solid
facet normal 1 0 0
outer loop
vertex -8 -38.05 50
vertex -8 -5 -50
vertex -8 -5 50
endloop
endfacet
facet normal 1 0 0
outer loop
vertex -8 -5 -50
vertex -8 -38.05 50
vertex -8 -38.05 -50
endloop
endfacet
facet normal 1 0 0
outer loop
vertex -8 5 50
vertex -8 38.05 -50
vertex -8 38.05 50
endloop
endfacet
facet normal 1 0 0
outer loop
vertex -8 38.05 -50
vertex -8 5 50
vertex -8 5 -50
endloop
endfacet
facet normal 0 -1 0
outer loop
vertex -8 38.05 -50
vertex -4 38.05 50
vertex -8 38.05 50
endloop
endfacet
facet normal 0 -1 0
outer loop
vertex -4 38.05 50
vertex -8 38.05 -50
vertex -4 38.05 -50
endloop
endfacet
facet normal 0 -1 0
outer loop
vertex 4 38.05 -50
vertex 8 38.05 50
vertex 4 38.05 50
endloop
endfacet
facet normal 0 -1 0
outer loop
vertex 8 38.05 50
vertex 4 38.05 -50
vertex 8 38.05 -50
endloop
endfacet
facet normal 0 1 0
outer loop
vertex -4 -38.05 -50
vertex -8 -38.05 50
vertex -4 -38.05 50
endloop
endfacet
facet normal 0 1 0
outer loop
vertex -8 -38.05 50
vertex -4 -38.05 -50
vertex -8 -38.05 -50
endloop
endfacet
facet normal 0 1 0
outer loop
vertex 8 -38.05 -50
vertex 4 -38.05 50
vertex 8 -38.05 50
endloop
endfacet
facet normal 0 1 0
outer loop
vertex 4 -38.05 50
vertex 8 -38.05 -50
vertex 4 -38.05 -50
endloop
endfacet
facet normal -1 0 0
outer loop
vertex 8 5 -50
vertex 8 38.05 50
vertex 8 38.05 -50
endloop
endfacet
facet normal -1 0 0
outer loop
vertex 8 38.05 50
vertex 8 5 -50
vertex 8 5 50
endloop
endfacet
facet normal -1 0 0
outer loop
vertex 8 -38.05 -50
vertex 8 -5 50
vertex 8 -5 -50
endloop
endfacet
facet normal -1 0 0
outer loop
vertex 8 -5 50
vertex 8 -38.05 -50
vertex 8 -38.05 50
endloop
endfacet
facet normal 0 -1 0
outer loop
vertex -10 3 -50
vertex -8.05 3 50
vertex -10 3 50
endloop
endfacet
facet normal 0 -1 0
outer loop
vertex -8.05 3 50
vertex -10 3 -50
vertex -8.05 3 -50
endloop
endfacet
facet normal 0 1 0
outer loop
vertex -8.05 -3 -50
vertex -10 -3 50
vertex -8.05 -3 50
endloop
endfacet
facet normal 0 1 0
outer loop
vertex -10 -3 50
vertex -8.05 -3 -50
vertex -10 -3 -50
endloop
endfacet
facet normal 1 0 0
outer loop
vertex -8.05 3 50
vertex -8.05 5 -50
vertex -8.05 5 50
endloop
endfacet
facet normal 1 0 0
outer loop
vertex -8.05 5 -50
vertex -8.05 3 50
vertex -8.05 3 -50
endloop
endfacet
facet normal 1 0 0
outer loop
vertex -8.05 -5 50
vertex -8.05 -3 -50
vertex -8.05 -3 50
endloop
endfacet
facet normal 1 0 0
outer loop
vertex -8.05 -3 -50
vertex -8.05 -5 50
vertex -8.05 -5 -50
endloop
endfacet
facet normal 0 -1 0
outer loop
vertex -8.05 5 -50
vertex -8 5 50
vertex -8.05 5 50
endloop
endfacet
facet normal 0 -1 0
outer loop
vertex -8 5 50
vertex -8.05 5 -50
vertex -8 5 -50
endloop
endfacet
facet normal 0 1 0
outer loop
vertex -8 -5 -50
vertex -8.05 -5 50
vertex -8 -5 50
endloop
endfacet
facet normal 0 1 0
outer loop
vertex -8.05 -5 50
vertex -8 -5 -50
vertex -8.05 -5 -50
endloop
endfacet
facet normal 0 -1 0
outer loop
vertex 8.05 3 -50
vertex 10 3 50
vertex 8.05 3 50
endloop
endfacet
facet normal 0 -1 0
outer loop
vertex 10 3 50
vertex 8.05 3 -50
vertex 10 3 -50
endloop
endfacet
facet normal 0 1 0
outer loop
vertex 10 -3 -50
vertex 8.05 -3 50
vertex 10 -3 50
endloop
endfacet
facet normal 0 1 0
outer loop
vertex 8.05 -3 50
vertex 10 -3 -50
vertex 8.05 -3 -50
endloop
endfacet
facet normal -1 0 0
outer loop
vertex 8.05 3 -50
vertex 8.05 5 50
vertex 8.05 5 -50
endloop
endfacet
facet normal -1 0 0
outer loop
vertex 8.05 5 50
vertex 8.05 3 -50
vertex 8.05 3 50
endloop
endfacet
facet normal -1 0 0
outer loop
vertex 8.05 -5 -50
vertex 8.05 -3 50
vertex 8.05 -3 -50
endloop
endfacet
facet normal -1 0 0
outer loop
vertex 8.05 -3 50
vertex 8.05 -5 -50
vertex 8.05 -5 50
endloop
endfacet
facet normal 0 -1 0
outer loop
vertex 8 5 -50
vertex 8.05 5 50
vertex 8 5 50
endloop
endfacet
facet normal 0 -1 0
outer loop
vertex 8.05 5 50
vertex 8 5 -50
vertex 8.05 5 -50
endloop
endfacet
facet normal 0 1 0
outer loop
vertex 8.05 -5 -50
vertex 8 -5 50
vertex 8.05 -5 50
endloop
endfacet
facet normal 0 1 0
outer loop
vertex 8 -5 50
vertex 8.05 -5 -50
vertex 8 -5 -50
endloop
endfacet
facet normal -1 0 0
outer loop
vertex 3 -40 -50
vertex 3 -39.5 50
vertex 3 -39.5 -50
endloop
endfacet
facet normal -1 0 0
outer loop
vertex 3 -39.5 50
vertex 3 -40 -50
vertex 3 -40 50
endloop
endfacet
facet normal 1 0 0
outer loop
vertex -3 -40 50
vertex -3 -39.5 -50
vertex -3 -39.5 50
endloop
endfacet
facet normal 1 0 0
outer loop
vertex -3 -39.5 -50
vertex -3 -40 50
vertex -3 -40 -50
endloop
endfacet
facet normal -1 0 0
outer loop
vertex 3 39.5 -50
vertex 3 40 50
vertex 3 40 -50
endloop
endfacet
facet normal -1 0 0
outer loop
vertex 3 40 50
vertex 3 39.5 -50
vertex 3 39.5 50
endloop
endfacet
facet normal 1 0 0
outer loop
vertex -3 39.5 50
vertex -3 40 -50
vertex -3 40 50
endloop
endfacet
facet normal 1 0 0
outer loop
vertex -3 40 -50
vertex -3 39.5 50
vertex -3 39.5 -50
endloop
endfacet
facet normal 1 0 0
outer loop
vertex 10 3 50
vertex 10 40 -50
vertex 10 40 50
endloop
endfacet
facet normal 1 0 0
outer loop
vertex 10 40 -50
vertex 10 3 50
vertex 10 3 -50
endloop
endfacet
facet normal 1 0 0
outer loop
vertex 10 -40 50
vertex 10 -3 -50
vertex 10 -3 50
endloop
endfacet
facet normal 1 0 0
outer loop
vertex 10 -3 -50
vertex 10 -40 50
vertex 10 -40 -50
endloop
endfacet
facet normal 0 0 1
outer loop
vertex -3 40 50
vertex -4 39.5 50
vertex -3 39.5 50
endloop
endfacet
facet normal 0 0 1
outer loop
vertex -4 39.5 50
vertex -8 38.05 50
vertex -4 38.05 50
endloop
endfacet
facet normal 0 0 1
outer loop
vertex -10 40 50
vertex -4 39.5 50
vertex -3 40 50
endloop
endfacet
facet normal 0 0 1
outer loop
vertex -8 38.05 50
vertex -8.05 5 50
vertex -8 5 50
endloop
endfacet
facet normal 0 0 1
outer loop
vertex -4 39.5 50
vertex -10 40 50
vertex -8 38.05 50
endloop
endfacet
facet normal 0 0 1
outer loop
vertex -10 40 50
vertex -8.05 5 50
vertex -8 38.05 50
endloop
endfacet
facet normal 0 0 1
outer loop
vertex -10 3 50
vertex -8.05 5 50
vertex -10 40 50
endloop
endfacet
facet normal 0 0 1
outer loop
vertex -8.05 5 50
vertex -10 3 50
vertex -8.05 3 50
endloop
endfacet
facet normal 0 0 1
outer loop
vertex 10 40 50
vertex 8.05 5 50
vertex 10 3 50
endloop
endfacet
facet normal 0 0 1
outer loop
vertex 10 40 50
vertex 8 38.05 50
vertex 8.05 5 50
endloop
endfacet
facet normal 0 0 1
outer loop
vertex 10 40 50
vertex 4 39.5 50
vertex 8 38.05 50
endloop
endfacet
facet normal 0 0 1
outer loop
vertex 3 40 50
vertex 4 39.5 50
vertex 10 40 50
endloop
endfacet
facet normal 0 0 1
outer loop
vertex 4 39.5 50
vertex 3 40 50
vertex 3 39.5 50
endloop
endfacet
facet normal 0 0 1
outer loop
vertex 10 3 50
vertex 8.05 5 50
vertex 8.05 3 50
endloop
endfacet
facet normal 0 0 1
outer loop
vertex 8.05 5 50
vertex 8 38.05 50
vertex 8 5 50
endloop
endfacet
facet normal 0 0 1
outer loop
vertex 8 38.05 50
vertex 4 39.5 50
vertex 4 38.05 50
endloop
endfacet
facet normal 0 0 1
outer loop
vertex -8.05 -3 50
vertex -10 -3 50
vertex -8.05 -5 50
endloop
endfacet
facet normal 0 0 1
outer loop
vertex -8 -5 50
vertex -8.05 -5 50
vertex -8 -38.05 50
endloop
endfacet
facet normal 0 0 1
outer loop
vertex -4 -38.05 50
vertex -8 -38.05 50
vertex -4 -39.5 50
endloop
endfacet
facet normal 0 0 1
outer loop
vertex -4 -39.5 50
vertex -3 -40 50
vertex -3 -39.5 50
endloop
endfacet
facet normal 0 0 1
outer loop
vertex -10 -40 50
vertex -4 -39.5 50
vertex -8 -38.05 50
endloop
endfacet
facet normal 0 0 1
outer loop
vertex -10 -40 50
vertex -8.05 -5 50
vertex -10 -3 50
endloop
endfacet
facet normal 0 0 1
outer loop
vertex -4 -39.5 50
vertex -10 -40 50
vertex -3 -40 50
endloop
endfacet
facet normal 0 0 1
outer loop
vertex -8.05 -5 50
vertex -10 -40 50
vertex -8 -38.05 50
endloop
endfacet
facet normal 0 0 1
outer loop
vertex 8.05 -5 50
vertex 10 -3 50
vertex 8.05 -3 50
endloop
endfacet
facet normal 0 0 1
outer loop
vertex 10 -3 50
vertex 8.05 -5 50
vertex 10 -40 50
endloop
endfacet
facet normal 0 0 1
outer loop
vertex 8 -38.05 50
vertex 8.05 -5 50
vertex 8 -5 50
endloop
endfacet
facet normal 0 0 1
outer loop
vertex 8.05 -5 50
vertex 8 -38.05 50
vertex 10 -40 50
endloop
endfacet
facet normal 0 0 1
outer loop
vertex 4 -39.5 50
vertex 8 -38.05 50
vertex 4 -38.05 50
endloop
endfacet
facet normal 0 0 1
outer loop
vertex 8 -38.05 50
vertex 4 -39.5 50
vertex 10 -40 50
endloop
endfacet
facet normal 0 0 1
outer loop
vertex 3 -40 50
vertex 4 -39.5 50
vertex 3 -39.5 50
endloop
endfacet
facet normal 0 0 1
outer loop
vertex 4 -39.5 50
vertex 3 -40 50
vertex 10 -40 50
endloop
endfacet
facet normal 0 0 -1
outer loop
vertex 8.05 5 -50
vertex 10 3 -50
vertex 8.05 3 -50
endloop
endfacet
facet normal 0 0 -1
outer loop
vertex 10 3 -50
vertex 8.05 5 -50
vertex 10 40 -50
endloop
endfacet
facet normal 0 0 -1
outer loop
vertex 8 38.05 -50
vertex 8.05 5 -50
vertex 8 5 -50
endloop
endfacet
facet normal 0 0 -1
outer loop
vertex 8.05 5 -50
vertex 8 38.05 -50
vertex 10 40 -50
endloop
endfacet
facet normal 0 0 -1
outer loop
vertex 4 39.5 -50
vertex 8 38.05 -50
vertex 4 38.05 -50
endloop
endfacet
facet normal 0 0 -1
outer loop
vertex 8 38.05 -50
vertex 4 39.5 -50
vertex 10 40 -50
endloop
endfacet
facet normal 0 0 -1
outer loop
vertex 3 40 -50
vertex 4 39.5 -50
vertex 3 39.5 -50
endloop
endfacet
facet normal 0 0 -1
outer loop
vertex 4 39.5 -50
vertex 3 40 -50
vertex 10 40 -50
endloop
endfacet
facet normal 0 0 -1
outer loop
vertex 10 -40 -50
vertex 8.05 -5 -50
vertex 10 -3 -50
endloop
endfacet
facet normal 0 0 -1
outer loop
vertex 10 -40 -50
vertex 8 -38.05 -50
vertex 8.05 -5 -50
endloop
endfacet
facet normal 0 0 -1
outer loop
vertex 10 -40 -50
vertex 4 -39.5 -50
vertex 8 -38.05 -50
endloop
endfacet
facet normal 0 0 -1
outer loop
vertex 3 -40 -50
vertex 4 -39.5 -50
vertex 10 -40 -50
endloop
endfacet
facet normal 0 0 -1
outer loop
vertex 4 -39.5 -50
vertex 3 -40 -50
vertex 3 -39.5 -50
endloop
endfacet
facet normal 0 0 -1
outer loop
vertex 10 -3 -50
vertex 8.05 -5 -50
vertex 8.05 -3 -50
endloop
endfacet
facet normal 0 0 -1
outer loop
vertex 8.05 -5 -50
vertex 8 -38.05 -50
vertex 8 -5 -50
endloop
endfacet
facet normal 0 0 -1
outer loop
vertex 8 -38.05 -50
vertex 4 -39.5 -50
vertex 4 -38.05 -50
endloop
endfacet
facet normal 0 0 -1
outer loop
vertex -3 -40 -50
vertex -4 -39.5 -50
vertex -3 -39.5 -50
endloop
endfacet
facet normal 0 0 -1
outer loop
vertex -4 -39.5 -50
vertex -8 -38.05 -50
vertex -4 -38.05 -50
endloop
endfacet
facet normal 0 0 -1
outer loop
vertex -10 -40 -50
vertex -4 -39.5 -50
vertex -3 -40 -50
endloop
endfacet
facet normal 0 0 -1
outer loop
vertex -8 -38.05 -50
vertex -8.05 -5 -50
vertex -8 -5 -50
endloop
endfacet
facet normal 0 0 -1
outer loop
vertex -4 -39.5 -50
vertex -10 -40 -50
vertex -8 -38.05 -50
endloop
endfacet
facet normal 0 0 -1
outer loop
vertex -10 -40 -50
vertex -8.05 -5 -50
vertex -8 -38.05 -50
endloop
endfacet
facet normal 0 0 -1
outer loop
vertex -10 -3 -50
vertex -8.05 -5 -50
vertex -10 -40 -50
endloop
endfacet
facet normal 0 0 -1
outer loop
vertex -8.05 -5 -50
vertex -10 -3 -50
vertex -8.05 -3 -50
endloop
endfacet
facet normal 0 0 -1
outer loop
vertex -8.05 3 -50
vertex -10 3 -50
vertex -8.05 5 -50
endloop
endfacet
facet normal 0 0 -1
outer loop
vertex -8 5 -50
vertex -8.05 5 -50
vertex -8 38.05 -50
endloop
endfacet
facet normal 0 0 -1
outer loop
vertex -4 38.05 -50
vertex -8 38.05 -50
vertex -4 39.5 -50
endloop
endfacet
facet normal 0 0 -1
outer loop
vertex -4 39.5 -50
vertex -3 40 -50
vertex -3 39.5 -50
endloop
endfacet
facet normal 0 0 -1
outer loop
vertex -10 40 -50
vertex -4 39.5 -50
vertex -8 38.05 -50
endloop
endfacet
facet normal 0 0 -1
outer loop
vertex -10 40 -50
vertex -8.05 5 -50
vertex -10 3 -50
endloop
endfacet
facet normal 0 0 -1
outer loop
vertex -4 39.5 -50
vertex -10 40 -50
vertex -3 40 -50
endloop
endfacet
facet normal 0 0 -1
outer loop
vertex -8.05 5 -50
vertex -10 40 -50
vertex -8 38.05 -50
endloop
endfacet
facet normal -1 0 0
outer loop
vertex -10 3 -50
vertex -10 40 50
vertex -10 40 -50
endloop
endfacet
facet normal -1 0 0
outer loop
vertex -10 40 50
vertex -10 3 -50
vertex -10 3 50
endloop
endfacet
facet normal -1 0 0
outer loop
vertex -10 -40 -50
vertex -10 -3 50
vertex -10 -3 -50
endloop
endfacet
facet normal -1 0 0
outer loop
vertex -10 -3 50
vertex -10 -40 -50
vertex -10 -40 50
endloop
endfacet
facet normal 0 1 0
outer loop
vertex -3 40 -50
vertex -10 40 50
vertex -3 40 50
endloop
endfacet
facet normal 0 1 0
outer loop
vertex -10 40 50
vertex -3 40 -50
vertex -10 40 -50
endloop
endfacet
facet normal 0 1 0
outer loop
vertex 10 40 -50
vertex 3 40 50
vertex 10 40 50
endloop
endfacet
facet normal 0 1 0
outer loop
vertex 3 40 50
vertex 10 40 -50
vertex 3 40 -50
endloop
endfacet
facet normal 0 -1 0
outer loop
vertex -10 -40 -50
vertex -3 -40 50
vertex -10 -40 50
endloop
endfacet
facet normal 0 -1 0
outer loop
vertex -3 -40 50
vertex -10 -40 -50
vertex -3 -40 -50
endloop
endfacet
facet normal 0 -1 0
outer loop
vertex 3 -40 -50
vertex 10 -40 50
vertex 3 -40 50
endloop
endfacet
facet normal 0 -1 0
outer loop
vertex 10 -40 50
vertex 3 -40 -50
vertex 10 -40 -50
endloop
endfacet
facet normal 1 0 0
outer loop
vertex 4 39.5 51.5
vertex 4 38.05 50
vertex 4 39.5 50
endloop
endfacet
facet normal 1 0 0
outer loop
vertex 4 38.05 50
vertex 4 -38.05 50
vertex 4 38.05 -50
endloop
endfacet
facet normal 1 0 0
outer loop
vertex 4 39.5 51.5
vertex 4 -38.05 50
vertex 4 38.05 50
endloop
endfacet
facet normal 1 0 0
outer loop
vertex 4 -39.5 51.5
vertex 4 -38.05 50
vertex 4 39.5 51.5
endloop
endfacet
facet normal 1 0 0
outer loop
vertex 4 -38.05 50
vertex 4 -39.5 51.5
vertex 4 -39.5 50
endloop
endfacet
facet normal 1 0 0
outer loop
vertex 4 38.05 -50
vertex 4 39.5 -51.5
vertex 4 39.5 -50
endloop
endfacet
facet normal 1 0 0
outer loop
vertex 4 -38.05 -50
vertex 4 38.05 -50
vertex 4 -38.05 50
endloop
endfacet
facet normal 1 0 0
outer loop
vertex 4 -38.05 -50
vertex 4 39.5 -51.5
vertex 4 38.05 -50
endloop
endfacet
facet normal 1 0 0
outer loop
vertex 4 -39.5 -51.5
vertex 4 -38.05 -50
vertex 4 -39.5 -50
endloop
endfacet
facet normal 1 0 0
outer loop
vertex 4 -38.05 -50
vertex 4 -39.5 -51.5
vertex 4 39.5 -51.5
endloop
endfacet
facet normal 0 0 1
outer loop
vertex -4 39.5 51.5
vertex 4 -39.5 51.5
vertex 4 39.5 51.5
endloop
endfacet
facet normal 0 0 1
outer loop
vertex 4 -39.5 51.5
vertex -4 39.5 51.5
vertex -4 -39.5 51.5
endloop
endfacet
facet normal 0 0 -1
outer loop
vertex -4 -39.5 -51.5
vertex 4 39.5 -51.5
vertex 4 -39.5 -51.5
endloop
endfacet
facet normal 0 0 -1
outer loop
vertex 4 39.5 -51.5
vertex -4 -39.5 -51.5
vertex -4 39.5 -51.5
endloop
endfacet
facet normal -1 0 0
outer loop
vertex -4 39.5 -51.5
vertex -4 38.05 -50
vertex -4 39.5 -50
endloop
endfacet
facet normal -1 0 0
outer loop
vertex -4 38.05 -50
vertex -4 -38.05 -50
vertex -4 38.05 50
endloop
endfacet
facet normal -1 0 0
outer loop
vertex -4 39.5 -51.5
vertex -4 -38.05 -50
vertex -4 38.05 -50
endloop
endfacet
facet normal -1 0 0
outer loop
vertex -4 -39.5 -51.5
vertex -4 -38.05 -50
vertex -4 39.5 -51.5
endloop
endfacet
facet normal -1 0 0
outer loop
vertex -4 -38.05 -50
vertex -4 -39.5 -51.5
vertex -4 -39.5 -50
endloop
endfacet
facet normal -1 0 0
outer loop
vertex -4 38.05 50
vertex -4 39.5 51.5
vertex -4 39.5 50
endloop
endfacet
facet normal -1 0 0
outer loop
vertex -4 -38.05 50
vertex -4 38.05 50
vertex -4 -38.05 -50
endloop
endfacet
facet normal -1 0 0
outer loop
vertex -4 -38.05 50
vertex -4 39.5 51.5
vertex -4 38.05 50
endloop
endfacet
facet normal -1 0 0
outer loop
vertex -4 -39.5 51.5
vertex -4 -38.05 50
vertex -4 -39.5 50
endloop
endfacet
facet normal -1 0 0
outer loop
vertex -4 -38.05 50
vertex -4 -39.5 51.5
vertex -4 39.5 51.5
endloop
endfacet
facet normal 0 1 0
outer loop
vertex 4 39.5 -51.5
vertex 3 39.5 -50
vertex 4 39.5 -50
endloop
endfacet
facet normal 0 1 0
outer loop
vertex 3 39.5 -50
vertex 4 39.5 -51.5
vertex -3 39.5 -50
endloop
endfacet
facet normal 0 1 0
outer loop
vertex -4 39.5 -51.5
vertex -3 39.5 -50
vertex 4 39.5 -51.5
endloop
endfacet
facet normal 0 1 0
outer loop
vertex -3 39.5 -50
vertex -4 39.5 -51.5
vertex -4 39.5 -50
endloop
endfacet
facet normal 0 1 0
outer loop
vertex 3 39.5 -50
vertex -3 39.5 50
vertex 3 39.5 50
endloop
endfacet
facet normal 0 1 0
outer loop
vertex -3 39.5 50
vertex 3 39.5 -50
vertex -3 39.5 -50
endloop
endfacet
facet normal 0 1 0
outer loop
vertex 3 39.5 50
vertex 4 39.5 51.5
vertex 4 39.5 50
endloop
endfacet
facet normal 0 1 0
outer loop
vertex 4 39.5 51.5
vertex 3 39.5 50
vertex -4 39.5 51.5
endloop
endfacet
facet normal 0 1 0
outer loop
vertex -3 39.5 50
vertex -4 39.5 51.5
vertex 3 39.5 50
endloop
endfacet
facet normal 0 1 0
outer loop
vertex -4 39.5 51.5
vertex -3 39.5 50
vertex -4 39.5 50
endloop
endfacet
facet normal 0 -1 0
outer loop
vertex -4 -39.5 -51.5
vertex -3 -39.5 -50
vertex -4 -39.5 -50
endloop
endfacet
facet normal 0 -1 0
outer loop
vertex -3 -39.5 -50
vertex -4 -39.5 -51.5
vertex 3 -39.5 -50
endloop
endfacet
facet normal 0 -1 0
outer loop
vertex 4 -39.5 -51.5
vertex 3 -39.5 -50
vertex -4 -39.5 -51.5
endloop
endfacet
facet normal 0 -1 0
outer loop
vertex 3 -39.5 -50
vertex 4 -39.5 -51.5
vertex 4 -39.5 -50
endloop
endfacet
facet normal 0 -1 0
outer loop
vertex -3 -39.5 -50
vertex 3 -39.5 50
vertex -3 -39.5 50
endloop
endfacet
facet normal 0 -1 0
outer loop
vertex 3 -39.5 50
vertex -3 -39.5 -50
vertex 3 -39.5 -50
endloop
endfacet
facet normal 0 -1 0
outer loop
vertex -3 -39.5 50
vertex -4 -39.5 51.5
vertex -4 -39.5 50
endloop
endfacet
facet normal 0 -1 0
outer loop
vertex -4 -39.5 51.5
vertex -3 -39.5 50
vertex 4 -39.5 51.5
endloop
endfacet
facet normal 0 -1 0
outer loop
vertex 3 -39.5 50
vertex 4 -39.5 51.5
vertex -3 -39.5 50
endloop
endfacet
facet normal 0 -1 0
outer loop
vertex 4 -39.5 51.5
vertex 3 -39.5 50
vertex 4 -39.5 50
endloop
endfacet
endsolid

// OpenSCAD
// 20x80 aluminium extrusion (approximate T-slot profile), 100mm long
// Cross-section: X=20mm, Y=80mm, Length along Z=100mm

$fn = 64;

module extrusion_20x80(len=100, w=20, h=80) {
    wall = 2.0;          // outer wall thickness
    slot_open = 6.0;     // opening at the surface
    slot_depth = 8.0;    // depth of slot from surface inward
    slot_neck = 3.0;     // narrow neck inside slot
    slot_wide = 10.0;    // wider cavity inside slot
    bore_r = 2.6;        // center bore radius (approx M5 clearance)
    web = 2.0;           // intended internal web thickness

    // Robust boolean tolerances
    eps = 0.05;

    // Required overlap to guarantee physical attachment (1-2mm)
    overlap = 1.5;

    inner_w = max(w - 2*wall, 0.01);
    inner_h = max(h - 2*wall, 0.01);

    // Keep a guaranteed solid mid-web, and ensure cavities never meet at center.
    web_keep = web + 2*overlap;

    // Each side cavity width; never exceed available space
    cav_w = max((inner_w - web_keep)/2, 0.01);

    // Place cavities so their inner faces are at +/- web_keep/2 (leaves solid web)
    cav_x = (web_keep/2) + (cav_w/2);

    // Add a central "stitch" rib that overlaps both halves to eliminate any mid-plane split.
    // Make it slightly taller than inner_h to ensure it intersects the remaining material
    // even if slot subtractions create near-coplanar faces.
    stitch_w = web_keep + 2*overlap;     // overlaps into both sides
    stitch_h = inner_h + 2*overlap;      // overlaps into top/bottom inner walls
    stitch_z = len + 2*overlap;          // overlaps along length

    union() {
        // Main body with subtractive features
        difference() {
            // Outer envelope
            cube([w, h, len], center=true);

            // Internal lightening cavities (left/right), leaving a guaranteed central web
            for (sx = [-1, 1]) {
                translate([sx*cav_x, 0, 0])
                    cube([cav_w, inner_h + 2*eps, len + 2*eps], center=true);
            }

            // Center bore
            cylinder(r=bore_r, h=len + 2*eps, center=true);

            // T-slots on all four faces (subtractive)
            // X faces (left/right)
            for (sx = [-1, 1]) {
                // Surface opening
                translate([sx*(w/2 - slot_depth/2 + eps), 0, 0])
                    cube([slot_depth + 2*eps, slot_open, len + 2*eps], center=true);

                // Neck (slightly deeper)
                translate([sx*(w/2 - (slot_depth*0.65)/2 + eps), 0, 0])
                    cube([slot_depth*0.65 + 2*eps, slot_neck, len + 2*eps], center=true);

                // Inner wider cavity (kept within wall region so it doesn't sever the web)
                translate([sx*(w/2 - wall - (slot_depth*0.35)/2), 0, 0])
                    cube([slot_depth*0.35 + 2*eps, slot_wide, len + 2*eps], center=true);
            }

            // Y faces (front/back)
            for (sy = [-1, 1]) {
                // Surface opening
                translate([0, sy*(h/2 - slot_depth/2 + eps), 0])
                    cube([slot_open, slot_depth + 2*eps, len + 2*eps], center=true);

                // Neck
                translate([0, sy*(h/2 - (slot_depth*0.65)/2 + eps), 0])
                    cube([slot_neck, slot_depth*0.65 + 2*eps, len + 2*eps], center=true);

                // Inner wider cavity
                translate([0, sy*(h/2 - wall - (slot_depth*0.35)/2), 0])
                    cube([slot_wide, slot_depth*0.35 + 2*eps, len + 2*eps], center=true);
            }
        }

        // Central stitch rib (adds material) to eliminate any mid-plane split/gap.
        // Oversized slightly so it *intersects* both halves by >= 1mm everywhere.
        cube([stitch_w, stitch_h, stitch_z], center=true);
    }
}

extrusion_20x80(len=100, w=20, h=80);
